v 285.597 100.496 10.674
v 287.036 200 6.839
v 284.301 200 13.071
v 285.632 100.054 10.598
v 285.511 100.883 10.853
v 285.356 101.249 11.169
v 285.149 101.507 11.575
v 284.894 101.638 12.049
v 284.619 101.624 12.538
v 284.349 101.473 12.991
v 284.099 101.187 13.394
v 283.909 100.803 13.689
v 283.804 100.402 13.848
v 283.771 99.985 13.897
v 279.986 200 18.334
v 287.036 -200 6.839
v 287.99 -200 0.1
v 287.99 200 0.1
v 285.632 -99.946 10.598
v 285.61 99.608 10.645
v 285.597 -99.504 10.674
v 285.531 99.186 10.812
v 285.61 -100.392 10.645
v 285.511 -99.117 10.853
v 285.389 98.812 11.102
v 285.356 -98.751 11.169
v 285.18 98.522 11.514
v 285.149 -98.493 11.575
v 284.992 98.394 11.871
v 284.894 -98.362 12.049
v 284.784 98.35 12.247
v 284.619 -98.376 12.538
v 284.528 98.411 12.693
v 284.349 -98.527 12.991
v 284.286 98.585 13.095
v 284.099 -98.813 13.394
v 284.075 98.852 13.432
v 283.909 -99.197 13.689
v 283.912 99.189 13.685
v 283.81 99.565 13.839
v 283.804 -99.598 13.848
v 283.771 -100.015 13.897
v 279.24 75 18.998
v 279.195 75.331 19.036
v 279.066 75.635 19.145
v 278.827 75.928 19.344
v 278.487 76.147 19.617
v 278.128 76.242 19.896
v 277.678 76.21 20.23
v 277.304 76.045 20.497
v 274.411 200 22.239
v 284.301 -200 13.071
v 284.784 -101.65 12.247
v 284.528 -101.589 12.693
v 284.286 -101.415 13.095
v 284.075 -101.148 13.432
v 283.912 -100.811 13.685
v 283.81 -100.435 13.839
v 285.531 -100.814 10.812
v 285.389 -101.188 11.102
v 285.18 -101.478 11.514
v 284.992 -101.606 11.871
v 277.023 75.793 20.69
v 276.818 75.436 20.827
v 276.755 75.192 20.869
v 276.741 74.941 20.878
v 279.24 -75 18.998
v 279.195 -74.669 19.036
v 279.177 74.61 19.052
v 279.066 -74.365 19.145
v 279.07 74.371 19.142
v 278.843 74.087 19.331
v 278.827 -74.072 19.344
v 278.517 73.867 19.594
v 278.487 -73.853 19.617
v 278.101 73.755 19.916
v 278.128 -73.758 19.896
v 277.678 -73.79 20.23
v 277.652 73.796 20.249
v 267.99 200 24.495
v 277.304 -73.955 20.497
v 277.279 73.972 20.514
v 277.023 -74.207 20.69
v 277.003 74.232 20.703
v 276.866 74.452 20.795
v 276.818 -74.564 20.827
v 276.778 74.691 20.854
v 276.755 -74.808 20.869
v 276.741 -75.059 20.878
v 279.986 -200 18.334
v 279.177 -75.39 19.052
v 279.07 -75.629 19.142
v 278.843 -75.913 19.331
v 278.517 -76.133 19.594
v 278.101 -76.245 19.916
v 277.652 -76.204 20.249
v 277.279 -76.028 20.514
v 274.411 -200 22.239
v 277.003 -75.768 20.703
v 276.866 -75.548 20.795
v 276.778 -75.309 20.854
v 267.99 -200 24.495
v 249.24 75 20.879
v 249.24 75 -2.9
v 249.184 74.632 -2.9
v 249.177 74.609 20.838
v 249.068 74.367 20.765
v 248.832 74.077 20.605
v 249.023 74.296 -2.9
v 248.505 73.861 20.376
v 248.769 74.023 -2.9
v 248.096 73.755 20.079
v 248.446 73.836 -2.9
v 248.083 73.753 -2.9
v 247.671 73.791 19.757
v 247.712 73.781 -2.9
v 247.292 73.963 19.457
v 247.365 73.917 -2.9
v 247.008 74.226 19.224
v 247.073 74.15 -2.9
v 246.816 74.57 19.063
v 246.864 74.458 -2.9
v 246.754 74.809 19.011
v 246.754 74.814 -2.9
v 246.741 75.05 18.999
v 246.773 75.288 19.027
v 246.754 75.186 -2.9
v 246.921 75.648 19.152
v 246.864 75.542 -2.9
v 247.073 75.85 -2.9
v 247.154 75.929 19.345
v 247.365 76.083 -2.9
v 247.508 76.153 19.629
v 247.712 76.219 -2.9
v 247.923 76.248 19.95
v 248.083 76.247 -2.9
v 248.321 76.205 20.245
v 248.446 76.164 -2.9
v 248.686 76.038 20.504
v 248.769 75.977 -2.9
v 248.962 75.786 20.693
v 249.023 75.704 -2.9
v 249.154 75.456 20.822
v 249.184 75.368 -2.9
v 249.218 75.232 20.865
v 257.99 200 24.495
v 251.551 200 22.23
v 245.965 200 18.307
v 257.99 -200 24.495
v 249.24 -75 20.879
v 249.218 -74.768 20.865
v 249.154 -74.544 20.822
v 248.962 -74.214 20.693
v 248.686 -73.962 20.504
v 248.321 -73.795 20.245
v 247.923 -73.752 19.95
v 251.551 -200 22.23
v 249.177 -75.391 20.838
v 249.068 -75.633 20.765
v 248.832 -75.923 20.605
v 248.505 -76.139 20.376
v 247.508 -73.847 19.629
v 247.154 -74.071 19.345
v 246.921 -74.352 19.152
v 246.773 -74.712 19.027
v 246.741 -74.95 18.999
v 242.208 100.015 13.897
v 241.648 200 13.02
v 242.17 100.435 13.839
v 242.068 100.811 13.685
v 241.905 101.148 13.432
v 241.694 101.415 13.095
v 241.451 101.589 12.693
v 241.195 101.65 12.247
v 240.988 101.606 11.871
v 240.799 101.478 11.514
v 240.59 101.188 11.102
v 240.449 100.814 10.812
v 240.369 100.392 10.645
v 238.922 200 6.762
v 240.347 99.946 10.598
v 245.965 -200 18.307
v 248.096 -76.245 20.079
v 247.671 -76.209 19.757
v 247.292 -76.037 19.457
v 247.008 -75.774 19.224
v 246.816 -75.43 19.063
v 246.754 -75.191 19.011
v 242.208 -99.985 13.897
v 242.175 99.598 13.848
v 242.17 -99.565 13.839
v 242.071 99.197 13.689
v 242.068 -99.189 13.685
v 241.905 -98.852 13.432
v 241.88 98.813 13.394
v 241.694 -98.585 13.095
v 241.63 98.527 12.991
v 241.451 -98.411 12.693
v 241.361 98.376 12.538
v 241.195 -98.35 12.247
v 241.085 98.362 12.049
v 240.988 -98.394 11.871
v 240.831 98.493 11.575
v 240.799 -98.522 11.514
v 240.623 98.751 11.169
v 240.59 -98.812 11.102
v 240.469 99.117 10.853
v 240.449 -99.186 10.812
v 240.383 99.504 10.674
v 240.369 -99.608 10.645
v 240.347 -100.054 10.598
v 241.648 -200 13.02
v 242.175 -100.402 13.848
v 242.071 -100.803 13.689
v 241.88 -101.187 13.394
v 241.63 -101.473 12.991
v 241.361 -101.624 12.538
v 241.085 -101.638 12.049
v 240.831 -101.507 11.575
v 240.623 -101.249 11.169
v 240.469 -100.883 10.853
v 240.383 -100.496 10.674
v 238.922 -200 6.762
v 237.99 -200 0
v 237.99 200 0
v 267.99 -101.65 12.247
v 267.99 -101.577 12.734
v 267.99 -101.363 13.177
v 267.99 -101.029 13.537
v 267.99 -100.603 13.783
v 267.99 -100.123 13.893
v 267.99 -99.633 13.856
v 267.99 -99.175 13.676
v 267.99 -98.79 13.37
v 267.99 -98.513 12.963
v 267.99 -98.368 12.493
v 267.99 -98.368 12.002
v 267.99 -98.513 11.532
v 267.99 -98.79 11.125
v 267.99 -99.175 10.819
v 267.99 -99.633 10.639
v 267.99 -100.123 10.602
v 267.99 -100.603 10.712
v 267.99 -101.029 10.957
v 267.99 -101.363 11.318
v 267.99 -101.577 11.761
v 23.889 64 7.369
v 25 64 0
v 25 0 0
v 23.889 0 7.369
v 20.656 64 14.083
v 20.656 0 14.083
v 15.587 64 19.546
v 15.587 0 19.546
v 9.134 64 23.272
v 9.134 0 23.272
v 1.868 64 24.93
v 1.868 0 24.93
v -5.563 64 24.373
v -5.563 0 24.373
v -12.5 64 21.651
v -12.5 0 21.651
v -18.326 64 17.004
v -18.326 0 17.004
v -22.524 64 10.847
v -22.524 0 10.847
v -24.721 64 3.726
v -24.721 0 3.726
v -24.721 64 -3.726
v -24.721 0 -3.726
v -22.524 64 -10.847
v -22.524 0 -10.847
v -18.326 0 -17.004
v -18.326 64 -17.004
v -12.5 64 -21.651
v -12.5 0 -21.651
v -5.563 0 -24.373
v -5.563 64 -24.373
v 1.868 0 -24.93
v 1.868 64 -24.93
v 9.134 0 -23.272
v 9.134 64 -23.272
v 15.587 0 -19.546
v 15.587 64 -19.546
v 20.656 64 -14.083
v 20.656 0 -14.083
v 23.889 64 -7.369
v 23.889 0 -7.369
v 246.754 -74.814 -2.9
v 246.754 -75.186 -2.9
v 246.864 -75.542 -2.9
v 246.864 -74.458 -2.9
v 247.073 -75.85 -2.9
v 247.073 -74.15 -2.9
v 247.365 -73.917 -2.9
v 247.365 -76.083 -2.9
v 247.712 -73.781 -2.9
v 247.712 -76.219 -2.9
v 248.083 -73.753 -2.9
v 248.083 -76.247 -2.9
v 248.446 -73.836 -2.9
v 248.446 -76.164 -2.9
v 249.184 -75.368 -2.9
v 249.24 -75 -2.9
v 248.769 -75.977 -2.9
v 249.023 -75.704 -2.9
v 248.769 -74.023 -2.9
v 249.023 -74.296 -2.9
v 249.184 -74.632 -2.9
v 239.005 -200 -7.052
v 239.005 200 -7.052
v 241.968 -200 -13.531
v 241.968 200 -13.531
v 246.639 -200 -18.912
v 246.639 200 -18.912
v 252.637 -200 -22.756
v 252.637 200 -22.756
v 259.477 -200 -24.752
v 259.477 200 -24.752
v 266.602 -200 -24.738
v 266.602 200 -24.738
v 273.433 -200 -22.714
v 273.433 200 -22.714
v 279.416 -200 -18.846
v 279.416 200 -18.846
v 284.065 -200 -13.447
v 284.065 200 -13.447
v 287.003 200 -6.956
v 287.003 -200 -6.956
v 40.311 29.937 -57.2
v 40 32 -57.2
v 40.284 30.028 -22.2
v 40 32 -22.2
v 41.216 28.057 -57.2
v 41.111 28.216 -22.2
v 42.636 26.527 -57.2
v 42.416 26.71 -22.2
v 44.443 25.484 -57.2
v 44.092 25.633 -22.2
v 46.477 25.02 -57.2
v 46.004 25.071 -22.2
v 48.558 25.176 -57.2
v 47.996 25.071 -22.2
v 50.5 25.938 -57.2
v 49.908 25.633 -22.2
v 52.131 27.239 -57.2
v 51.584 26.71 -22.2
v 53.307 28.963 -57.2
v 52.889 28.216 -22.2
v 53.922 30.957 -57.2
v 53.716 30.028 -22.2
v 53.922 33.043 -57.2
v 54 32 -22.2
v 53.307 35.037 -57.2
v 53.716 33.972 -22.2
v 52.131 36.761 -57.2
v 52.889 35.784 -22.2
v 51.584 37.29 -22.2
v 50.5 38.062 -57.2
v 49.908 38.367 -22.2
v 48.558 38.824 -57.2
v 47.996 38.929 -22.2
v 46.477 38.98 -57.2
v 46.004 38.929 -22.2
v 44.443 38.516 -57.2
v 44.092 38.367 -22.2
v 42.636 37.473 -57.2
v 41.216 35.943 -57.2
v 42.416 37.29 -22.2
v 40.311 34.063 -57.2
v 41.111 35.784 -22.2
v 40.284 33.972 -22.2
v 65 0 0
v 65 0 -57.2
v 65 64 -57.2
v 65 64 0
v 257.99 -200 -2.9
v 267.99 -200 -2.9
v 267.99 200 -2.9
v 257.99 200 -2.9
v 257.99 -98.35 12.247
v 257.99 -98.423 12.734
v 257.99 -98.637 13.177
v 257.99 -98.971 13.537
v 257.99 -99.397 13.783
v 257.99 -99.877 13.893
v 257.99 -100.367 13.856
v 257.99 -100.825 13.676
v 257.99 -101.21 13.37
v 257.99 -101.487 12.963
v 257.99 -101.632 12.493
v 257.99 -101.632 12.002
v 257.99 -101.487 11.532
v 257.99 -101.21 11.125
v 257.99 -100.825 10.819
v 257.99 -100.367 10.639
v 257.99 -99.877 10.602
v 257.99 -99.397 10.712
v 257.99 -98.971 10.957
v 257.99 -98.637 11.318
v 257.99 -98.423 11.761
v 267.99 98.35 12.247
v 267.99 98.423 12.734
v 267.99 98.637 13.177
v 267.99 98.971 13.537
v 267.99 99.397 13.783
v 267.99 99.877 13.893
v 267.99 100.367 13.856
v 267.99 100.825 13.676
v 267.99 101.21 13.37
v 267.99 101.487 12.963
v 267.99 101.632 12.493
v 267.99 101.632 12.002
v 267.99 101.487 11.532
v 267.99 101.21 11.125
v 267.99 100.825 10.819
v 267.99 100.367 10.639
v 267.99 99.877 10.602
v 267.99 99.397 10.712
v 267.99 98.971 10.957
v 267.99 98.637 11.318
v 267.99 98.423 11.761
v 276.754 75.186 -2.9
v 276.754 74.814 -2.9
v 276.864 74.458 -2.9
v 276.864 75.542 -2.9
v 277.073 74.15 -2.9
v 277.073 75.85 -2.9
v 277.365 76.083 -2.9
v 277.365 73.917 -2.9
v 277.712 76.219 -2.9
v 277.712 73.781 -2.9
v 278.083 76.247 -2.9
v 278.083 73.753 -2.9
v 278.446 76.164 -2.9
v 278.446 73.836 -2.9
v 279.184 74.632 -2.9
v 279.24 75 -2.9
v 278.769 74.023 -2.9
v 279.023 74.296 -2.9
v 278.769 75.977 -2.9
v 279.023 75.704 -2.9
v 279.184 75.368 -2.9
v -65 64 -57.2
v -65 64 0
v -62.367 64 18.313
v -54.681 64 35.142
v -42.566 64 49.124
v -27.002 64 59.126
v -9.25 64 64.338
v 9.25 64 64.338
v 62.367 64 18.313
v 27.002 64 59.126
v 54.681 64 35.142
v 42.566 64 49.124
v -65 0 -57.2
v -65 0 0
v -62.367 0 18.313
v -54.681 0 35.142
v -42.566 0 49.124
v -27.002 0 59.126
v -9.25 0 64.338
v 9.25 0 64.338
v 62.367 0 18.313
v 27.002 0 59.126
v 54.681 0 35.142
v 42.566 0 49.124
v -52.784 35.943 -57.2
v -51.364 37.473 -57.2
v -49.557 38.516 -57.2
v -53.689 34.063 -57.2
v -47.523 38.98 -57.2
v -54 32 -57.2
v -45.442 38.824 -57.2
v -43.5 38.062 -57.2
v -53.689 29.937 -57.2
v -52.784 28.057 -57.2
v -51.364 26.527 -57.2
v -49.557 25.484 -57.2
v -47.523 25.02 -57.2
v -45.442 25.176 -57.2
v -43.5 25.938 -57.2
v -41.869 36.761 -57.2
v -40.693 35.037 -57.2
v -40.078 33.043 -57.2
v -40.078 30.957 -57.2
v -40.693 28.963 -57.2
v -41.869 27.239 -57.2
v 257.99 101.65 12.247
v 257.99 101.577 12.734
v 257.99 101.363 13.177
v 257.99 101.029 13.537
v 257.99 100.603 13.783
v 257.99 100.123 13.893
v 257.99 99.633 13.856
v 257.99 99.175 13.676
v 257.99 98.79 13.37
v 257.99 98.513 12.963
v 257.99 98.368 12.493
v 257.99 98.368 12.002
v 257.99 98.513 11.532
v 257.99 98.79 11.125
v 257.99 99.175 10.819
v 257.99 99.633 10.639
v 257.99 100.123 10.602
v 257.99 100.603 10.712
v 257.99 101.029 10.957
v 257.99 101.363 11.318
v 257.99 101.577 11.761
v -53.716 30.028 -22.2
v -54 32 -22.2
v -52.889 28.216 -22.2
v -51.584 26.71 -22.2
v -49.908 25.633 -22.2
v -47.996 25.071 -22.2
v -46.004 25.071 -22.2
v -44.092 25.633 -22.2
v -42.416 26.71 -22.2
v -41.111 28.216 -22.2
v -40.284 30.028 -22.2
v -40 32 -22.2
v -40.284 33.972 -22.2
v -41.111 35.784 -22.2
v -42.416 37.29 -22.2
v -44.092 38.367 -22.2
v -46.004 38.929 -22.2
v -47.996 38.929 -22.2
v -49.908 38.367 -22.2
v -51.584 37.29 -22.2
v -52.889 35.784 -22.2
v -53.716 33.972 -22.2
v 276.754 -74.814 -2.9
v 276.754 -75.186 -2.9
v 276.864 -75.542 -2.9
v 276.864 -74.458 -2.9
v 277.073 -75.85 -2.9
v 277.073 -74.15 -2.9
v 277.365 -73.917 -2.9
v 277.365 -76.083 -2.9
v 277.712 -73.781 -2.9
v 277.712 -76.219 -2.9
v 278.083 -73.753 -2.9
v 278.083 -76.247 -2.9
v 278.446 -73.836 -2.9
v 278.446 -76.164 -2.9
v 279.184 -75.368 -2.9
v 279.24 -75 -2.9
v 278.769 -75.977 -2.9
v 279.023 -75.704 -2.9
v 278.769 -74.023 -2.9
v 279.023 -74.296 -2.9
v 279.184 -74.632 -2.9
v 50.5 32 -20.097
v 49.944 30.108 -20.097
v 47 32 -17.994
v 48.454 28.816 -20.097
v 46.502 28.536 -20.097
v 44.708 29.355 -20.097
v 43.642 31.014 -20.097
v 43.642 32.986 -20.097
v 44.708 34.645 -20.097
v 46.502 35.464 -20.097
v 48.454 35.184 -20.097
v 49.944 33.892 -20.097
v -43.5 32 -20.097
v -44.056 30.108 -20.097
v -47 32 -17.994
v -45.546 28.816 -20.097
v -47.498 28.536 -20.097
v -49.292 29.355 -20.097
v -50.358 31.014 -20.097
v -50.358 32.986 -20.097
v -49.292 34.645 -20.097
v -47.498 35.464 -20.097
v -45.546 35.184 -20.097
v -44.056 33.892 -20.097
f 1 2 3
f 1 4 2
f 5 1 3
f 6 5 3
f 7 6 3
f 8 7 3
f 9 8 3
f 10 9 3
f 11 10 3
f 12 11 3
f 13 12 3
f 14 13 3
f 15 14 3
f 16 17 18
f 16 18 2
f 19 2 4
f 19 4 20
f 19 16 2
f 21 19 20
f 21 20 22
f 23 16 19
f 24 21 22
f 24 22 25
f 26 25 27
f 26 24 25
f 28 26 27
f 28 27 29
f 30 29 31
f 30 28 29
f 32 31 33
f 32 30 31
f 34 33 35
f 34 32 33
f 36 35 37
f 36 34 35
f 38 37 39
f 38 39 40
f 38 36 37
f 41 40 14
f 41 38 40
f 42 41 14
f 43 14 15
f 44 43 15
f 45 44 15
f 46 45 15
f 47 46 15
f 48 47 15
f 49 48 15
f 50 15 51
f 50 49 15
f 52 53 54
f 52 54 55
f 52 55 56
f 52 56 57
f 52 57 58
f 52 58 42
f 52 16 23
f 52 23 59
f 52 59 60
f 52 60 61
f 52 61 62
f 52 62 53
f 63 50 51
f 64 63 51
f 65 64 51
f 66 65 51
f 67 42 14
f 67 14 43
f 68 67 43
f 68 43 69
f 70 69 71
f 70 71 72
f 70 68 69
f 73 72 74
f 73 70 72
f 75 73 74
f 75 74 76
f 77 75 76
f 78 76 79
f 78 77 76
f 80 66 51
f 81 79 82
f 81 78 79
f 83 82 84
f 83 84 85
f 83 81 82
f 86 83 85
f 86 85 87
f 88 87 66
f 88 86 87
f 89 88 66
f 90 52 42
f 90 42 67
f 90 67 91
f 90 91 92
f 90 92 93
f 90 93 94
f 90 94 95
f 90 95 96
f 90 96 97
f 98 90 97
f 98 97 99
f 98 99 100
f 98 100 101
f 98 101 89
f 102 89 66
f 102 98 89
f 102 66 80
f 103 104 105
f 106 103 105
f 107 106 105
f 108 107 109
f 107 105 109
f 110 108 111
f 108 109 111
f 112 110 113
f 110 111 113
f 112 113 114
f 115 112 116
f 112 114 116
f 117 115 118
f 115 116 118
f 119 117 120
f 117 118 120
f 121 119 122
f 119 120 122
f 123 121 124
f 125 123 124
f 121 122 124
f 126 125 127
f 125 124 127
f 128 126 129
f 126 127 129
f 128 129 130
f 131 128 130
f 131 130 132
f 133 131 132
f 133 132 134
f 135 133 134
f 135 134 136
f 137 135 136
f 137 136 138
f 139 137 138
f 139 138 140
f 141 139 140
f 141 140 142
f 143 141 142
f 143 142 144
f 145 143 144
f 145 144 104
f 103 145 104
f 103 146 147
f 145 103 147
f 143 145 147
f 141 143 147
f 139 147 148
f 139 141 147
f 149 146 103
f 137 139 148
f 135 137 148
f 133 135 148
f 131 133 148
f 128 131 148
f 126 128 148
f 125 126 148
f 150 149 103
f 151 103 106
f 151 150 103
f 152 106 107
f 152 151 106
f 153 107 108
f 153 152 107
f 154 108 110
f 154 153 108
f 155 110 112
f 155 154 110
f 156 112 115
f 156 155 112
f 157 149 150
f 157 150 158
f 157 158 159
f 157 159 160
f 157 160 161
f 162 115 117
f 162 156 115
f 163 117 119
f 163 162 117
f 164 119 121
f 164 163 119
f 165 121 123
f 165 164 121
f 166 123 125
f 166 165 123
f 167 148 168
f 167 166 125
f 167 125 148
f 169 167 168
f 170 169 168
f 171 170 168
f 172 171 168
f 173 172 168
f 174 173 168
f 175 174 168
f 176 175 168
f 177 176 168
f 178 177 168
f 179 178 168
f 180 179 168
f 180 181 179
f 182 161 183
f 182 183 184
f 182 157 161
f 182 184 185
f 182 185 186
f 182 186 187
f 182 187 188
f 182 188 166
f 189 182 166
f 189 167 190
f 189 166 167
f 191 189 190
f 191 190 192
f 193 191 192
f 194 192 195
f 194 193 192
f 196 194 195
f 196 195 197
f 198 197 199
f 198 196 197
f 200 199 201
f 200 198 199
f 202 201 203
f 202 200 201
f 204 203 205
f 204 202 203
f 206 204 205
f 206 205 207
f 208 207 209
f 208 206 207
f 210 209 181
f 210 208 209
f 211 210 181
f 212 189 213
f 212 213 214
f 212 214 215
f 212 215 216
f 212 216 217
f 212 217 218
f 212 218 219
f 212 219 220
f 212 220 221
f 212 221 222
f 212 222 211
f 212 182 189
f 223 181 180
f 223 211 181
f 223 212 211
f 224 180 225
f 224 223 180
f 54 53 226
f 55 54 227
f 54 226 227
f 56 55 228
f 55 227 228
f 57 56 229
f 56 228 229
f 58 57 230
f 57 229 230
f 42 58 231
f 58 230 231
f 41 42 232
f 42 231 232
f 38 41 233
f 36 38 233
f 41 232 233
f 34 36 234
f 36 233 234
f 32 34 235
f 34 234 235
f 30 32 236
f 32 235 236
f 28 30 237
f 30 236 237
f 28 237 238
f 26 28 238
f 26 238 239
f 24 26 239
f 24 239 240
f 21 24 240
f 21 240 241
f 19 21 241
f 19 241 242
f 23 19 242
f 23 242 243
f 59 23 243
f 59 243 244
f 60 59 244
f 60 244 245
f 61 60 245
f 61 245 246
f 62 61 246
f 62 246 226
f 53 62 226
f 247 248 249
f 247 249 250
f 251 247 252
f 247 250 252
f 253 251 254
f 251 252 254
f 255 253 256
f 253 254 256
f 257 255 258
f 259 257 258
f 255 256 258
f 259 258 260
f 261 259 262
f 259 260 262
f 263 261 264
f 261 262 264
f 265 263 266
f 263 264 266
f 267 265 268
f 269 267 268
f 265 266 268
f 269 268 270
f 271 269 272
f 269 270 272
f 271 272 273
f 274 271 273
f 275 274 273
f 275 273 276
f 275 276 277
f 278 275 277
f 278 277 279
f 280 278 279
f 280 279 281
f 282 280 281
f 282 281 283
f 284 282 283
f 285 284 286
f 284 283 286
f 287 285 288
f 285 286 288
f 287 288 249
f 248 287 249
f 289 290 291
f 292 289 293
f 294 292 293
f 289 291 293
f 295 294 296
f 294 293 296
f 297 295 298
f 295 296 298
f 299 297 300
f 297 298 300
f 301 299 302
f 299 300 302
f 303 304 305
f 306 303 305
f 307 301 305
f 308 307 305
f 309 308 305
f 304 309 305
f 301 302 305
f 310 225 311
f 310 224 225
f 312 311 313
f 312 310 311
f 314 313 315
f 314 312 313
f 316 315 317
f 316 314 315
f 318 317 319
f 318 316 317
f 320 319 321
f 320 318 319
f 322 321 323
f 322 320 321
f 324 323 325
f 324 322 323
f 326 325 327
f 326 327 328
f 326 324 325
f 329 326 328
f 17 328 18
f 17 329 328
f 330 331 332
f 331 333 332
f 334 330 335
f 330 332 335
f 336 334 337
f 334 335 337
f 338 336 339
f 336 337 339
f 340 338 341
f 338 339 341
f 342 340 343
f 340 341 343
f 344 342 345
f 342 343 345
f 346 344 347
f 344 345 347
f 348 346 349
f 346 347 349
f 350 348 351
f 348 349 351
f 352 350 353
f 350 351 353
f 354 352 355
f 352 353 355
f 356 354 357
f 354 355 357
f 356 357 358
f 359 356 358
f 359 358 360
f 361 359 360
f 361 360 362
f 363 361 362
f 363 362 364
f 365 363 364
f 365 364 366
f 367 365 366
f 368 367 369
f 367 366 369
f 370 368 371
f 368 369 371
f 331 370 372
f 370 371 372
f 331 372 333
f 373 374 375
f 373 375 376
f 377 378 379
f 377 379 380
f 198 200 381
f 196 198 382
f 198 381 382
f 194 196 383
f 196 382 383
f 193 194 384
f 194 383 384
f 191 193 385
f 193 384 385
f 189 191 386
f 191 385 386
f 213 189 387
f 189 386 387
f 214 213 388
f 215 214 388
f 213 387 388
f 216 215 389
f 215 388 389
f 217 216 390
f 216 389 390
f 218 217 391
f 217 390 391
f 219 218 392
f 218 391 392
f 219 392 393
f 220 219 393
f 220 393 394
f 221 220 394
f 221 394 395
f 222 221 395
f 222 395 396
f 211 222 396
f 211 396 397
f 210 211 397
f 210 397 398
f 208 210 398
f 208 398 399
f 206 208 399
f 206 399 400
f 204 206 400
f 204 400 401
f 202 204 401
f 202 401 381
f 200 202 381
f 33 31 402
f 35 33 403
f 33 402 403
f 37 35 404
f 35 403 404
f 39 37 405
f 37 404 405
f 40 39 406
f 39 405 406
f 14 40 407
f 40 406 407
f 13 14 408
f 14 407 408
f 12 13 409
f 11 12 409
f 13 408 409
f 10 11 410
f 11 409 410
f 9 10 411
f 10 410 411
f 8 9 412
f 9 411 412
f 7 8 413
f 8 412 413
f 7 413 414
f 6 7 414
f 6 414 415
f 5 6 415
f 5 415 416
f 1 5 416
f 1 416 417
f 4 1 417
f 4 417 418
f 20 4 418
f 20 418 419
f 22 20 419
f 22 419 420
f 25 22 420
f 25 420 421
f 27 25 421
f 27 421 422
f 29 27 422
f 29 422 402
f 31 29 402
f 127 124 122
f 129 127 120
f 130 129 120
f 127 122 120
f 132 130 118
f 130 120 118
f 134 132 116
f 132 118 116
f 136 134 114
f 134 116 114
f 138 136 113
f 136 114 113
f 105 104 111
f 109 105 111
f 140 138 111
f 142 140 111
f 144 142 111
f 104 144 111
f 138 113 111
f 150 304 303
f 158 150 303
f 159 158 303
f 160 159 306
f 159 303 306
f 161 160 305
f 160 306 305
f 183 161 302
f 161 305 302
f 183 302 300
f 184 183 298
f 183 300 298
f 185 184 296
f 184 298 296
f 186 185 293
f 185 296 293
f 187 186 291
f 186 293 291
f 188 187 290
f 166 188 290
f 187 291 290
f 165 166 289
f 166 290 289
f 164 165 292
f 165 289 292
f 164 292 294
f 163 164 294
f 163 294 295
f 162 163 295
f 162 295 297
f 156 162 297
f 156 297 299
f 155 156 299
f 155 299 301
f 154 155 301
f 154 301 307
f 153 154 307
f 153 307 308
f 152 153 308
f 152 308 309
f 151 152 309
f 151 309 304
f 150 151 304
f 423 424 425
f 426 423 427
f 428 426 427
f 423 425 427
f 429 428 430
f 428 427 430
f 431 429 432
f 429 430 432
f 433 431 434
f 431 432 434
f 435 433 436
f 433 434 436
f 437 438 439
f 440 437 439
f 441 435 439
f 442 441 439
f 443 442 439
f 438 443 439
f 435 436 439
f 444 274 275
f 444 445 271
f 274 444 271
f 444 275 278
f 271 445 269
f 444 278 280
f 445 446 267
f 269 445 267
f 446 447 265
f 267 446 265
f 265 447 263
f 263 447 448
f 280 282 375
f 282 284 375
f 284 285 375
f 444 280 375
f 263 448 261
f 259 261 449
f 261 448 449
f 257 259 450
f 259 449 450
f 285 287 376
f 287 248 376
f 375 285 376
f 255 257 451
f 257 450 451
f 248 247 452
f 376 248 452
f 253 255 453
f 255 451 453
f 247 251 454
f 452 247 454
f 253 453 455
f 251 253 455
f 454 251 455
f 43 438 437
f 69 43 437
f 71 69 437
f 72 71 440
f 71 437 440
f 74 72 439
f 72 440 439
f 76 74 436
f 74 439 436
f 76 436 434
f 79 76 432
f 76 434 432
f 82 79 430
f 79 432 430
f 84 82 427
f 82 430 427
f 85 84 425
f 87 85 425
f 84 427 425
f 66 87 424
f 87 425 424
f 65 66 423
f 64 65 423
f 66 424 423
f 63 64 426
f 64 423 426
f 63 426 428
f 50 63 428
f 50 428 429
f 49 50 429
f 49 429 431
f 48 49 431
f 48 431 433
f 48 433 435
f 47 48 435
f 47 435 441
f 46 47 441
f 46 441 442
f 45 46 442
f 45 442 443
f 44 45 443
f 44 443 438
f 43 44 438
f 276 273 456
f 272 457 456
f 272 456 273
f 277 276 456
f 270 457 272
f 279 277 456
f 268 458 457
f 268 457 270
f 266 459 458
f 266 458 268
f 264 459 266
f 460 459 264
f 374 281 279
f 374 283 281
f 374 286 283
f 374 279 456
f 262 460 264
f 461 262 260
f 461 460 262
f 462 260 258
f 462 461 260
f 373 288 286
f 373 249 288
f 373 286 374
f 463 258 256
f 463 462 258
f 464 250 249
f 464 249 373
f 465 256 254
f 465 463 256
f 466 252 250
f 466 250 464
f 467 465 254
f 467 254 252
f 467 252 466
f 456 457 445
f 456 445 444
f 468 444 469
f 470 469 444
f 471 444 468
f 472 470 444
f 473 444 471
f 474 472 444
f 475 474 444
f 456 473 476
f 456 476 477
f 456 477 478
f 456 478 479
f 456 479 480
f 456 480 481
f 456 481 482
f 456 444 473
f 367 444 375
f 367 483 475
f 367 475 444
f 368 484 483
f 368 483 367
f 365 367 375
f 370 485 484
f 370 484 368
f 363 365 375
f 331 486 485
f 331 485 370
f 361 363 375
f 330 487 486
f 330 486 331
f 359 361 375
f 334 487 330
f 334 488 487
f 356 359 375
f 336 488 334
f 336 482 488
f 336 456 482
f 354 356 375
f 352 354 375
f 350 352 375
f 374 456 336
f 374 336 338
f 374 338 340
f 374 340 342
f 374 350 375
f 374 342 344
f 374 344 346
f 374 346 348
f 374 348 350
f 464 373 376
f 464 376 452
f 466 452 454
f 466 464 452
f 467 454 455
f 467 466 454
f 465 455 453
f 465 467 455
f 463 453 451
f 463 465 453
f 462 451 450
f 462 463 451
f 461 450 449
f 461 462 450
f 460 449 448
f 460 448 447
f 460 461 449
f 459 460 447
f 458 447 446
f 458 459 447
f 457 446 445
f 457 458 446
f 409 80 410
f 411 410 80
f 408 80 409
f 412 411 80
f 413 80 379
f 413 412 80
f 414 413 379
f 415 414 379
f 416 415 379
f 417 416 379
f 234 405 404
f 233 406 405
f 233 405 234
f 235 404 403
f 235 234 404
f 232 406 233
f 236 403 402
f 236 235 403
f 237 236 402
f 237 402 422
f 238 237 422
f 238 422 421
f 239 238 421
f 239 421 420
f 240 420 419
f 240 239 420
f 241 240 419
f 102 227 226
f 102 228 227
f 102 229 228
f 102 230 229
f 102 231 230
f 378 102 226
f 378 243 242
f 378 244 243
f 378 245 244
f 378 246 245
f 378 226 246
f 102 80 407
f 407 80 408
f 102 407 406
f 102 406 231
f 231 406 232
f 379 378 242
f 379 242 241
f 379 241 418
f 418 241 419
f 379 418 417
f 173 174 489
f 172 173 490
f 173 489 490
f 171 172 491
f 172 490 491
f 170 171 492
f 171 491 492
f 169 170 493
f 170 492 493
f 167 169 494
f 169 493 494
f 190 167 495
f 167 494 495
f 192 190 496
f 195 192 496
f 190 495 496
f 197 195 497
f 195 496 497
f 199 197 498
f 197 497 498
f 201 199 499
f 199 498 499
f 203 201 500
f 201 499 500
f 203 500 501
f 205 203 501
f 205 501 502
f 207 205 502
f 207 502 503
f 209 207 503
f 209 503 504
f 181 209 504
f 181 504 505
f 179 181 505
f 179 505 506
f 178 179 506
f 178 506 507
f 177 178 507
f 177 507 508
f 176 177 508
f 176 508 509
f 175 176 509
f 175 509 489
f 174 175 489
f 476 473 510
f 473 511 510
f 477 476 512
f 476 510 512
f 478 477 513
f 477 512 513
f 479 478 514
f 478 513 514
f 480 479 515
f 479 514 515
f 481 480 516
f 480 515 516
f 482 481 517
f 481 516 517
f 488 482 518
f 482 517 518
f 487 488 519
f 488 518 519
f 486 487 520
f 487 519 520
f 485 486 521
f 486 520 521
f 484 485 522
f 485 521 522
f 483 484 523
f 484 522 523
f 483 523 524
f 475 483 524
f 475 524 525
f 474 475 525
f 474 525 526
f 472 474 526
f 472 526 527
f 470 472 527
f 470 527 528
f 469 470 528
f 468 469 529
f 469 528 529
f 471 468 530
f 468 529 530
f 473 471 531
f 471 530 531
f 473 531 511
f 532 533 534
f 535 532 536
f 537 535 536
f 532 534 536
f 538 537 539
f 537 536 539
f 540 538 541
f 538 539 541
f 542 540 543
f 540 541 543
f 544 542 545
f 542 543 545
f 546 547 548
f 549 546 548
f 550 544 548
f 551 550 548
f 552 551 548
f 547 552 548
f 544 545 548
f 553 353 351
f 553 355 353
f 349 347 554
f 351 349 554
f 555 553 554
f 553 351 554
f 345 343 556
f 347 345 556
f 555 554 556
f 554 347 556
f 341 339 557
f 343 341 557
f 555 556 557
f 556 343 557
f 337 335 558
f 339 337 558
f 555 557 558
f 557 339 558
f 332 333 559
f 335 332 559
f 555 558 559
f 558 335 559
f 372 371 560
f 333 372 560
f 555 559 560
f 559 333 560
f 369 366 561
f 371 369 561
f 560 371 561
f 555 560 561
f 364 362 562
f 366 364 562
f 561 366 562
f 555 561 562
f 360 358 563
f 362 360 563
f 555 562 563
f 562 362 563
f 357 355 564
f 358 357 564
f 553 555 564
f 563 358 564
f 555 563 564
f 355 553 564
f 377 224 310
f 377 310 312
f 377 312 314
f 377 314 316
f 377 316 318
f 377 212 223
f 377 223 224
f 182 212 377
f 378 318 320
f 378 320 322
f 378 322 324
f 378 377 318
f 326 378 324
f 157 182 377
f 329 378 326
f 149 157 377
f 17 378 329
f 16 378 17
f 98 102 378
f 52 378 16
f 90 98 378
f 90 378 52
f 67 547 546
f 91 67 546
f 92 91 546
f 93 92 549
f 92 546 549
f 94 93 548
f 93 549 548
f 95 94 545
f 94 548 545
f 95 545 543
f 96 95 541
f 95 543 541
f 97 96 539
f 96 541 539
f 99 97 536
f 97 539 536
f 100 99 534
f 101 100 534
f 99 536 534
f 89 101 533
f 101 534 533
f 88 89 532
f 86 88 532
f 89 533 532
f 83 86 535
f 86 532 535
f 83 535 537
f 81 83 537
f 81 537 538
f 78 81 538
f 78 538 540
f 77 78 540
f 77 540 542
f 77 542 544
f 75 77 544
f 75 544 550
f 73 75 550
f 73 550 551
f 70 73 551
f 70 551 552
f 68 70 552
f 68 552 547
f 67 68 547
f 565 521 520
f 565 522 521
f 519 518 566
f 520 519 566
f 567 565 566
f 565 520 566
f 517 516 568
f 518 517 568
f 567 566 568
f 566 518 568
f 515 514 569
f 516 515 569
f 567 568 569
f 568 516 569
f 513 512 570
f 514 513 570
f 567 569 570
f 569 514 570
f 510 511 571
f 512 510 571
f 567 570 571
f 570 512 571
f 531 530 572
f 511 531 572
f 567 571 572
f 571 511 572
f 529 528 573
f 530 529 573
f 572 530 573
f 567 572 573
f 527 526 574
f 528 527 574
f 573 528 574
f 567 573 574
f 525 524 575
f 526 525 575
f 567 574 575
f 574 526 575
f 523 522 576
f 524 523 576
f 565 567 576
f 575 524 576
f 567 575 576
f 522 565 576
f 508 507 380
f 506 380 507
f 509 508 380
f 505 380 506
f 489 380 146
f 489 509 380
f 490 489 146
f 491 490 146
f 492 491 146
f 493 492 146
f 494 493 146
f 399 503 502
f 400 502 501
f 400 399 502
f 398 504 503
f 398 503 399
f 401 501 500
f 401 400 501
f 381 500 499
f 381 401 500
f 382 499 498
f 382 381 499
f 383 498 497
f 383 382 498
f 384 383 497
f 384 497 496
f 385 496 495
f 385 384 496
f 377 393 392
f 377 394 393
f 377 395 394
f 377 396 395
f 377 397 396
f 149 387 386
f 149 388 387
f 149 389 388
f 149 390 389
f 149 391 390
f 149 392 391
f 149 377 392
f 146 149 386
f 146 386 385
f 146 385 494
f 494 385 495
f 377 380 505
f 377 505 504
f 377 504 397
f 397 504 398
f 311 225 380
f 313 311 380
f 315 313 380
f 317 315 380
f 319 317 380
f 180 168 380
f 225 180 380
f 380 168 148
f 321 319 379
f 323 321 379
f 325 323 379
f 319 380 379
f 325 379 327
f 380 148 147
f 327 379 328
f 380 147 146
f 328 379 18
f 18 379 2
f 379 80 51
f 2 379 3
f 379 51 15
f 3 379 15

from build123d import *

# Parameters (mm, degrees)
F0_R           = 25
F1_DEPTH       = 64
F3_DEPTH       = 200
F6_D           = 3.3
F6_DEPTH       = 20.001
F6_ON_F5_D     = 3.3
F6_ON_F5_DEPTH = 20.001
F8_D           = 2.5
F8_DEPTH       = 25
F8_TIP         = 0.7510757738
F10_D          = 14
F10_DEPTH      = 35
F10_TIP        = 4.2060243332


# Not quite as in the source:
# - a feature names something its author has since deleted; it is built from what else it names


with BuildPart() as f1:
    # F0 (on Front) → F1 (new body)
    with BuildSketch(Plane.XZ):
        with BuildLine():
            Line((65, -57.2), (65, 0))
            ThreePointArc((65, 0), (0, 65), (-65, 0))
            Line((-65, 0), (-65, -57.2))
            Line((-65, -57.2), (0, -57.2))
            Line((0, -57.2), (65, -57.2))
        make_face()
        Circle(F0_R, mode=Mode.SUBTRACT)
    extrude(amount=-F1_DEPTH)

    # F10
    with Locations(Plane(origin=(0, 0, -57.2), x_dir=(1, 0, 0), z_dir=(0, 0, -1))):
        with Locations((-47, -32), (47, -32)):
            Hole(F10_D / 2, depth=F10_DEPTH)
            with Locations((0, 0, -(F10_DEPTH + F10_TIP / 2))):  # 118° drill point
                Cone(0, F10_D / 2, F10_TIP, mode=Mode.SUBTRACT)


with BuildPart() as f3:
    # F2 (on Front) → F3 (new body, symmetric)
    with BuildSketch(Plane.XZ):
        with BuildLine():
            ThreePointArc((237.9897642136, 0), (263.0397643136, -24.9999499997), (287.9895642128, 0.1))
            ThreePointArc((287.9895642128, 0.1), (282.3230193747, 15.8500865888), (267.9897642136, 24.4948974278))
            Line((267.9897642136, 24.4948974278), (267.9897642136, -2.9))
            Line((267.9897642136, -2.9), (257.9897642136, -2.9))
            Line((257.9897642136, -2.9), (257.9897642136, 24.4948974278))
            ThreePointArc((257.9897642136, 24.4948974278), (243.6248474825, 15.8113883008), (237.9897642136, 0))
        make_face()
    extrude(amount=F3_DEPTH, both=True)

    # F6 (through all, one way)
    with BuildSketch(Plane.YZ.offset(257.9897642136)):
        with Locations((100, 12.2474487139), (-100, 12.2474487139)):
            Circle(F6_D / 2)
    extrude(amount=-F6_DEPTH, mode=Mode.SUBTRACT)

    # F6 on F5 (through all, one way)
    with BuildSketch(Plane(origin=(267.9897642136, 0, 0), x_dir=(0, -1, 0), z_dir=(-1, 0, 0))):
        with Locations((-100, 12.2474487139), (100, 12.2474487139)):
            Circle(F6_ON_F5_D / 2)
    extrude(amount=-F6_ON_F5_DEPTH, mode=Mode.SUBTRACT)

    # F8 (one way)
    with BuildSketch(Plane(origin=(0, 0, -2.9), x_dir=(1, 0, 0), z_dir=(0, 0, -1))):
        with Locations((247.9897642136, 75), (277.9897642136, 75), (277.9897642136, -75), (247.9897642136, -75)):
            Circle(F8_D / 2)
    extrude(amount=-F8_DEPTH, mode=Mode.SUBTRACT)
    with Locations(Plane(origin=(0, 0, -2.9), x_dir=(1, 0, 0), z_dir=(0, 0, -1))):
        with Locations((247.9897642136, 75), (277.9897642136, 75), (277.9897642136, -75), (247.9897642136, -75)):
            with Locations((0, 0, -(F8_DEPTH + F8_TIP / 2))):  # 118° drill point
                Cone(0, F8_D / 2, F8_TIP, mode=Mode.SUBTRACT)


solid = Compound([f1.part, f3.part])
